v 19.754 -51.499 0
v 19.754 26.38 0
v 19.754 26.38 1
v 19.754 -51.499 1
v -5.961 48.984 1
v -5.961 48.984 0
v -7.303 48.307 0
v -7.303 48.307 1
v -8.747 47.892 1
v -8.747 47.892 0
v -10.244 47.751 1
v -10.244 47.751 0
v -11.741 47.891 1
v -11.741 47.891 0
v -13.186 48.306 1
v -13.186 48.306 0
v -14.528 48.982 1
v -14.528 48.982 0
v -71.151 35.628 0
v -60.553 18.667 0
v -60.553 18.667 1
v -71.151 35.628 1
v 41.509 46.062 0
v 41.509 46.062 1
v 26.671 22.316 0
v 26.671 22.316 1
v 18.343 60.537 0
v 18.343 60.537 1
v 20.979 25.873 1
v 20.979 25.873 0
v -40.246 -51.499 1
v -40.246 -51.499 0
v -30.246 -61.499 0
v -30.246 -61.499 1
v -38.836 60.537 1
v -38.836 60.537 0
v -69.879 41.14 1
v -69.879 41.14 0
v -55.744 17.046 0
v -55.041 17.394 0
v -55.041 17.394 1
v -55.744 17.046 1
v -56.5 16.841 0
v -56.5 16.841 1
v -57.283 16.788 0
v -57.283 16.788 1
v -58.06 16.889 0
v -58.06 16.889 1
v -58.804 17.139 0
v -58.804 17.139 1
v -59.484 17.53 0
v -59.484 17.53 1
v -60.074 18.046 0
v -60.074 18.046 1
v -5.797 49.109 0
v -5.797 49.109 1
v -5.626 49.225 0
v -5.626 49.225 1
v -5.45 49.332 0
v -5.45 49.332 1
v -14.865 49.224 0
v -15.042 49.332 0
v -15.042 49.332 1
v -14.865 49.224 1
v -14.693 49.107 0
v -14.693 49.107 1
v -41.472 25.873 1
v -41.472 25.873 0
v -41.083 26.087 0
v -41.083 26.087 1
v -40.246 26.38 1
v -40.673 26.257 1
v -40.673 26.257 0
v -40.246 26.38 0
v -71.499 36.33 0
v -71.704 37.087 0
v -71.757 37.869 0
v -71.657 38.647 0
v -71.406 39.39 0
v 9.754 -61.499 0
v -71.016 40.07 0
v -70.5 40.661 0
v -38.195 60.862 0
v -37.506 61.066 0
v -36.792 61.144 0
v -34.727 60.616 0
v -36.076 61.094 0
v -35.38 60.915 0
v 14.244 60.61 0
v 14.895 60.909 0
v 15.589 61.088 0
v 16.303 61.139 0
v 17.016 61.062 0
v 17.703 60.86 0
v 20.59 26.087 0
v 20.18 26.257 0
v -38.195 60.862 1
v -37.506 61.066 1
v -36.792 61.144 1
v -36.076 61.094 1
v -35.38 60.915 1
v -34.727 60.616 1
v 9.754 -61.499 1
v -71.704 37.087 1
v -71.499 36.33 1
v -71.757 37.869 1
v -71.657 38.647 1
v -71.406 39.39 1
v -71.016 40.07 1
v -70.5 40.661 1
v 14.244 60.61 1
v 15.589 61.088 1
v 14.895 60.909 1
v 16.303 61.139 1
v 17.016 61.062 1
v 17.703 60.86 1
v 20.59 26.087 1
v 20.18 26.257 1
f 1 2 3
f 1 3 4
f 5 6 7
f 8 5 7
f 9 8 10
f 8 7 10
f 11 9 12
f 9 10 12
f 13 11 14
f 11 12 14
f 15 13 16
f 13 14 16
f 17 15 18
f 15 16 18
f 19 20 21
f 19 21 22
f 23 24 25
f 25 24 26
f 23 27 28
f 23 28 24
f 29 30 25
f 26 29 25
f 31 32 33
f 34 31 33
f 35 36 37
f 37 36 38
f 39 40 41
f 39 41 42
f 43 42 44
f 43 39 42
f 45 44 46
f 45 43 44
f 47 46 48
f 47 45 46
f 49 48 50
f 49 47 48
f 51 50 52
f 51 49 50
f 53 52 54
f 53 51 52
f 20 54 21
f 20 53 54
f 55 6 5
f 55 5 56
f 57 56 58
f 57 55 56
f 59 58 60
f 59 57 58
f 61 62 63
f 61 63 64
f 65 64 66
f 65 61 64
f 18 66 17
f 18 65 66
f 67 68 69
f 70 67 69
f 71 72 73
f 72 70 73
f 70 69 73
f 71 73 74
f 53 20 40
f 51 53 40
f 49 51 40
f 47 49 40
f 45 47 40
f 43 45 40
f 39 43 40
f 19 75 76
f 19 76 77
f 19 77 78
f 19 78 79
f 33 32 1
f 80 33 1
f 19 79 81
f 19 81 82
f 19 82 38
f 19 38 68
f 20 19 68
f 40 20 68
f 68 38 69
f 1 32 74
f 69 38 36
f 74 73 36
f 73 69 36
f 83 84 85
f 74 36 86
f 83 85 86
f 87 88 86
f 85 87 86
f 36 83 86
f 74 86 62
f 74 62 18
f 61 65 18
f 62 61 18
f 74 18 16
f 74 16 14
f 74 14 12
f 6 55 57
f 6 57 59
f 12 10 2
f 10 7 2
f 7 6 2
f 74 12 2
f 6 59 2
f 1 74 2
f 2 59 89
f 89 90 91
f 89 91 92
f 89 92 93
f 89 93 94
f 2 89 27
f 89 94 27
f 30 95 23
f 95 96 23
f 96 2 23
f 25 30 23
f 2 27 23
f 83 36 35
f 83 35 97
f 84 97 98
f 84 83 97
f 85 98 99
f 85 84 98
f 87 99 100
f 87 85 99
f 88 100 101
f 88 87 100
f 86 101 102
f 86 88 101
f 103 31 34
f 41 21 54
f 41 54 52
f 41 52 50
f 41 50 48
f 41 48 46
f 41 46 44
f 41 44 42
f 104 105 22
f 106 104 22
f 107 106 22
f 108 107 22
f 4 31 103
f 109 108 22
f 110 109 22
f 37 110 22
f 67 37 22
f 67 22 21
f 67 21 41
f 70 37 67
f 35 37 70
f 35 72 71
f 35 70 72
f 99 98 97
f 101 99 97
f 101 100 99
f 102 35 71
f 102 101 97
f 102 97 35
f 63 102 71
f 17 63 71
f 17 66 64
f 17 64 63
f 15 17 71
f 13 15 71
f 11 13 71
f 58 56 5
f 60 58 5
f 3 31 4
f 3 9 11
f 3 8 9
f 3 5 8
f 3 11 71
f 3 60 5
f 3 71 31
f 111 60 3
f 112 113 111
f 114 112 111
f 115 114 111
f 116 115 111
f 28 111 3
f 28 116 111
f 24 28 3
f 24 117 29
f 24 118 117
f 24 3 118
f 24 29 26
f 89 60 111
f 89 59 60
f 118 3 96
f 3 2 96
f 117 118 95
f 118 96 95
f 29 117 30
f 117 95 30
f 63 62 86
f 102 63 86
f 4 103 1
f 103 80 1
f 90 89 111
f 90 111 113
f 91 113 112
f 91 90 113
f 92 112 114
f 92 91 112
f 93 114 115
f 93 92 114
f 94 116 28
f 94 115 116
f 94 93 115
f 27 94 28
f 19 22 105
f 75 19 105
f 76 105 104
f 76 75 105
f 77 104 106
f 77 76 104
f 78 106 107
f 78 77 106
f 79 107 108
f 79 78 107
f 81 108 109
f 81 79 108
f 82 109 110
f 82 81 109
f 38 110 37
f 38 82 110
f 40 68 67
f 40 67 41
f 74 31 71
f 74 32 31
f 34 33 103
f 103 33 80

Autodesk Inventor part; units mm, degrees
ref_plane "YZ Plane" through (0, 0, 0) normal (1, 0, 0) x (0, 1, 0)
ref_plane "XZ Plane" through (0, 0, 0) normal (0, 1, 0) x (-1, 0, 0)
ref_plane "XY Plane" through (0, 0, 0) normal (0, 0, 1) x (1, 0, 0)
sketch "Sketch1" plane through (0, 0, 0) normal (0, 0, 1) x (1, 0, 0)
  line L0 (19.7536, 18.501) -> (19.7536, -51.499)
  line L1 (-40.2464, -51.499) -> (-40.2464, 18.501)
  line L2 (-40.2464, -51.499) -> (-30.2464, -61.499)
  line L3 (-30.2464, -61.499) -> (9.7536, -61.499)
  line L4 (9.7536, -61.499) -> (19.7536, -51.499)
  line L5 (5.9033, -42.3953) -> (-35.9604, 24.6005)
  line L6 (-41.4722, 25.873) -> (-55.041, 17.3943)
  line L7 (-60.5529, 18.6668) -> (-71.151, 35.6275)
  line L8 (8.6592, -43.0315) -> (13.7475, -39.852)
  line L9 (14.3837, -37.0961) -> (-27.4799, 29.8997)
  line L10 (-26.2074, 35.4116) -> (-14.9119, 42.4698)
  line L11 (-15.0424, 49.3323) -> (-34.727, 60.6155)
  line L12 (-38.8359, 60.5374) -> (-69.8786, 41.1398)
  arc A0 (-34.727, 60.6155) -> (-38.8359, 60.5374) centre (-36.7162, 57.1452) ccw
  arc A1 (-14.9119, 42.4698) -> (-15.0424, 49.3323) centre (-17.0316, 45.8619) ccw
  arc A2 (-35.9604, 24.6005) -> (-41.4722, 25.873) centre (-39.3526, 22.4808) ccw
  arc A3 (-26.2074, 35.4116) -> (-27.4799, 29.8997) centre (-24.0877, 32.0194) ccw
  arc A4 (5.9033, -42.3953) -> (8.6592, -43.0315) centre (7.5994, -41.3354) ccw
  arc A5 (13.7475, -39.852) -> (14.3837, -37.0961) centre (12.6876, -38.1559) ccw
  line L13 (-26.3961, -42.3953) -> (15.4675, 24.6005)
  line L14 (20.9794, 25.873) -> (34.5482, 17.3943)
  line L15 (40.3411, 19.095) -> (50.6682, 35.6217)
  line L16 (-29.152, -43.0315) -> (-34.2403, -39.852)
  line L17 (-34.8766, -37.0961) -> (6.9871, 29.8997)
  line L18 (5.7136, 35.4098) -> (-5.5789, 42.4725)
  line L19 (-5.4504, 49.3323) -> (14.2435, 60.6103)
  line L20 (18.3431, 60.5374) -> (49.3859, 41.1397)
  arc A6 (18.3431, 60.5374) -> (14.2435, 60.6103) centre (16.2322, 57.1397) ccw
  arc A7 (-5.4504, 49.3323) -> (-5.5789, 42.4725) centre (-3.4579, 45.8638) ccw
  arc A8 (20.9794, 25.873) -> (15.4675, 24.6005) centre (18.8597, 22.4808) ccw
  arc A9 (6.9871, 29.8997) -> (5.7136, 35.4098) centre (3.5938, 32.0177) ccw
  arc A10 (-29.152, -43.0315) -> (-26.3961, -42.3953) centre (-28.0922, -41.3354) ccw
  arc A11 (-34.8766, -37.0961) -> (-34.2403, -39.852) centre (-33.1805, -38.1559) ccw
  arc A12 (-15.0424, 49.3323) -> (-5.4504, 49.3323) centre (-10.2464, 55.8144) ccw
  circle A13 centre (-10.2464, -7.115) radius 26
  circle A14 centre (-10.2464, -7.115) radius 20
  line L21 (-40.2464, 18.501) -> (-40.2464, 26.3797)
  line L22 (19.7536, 18.501) -> (19.7536, 26.3797)
  line L23 (-60.5529, 18.6668) -> (-60.5529, 18.6668)
  line L24 (-55.041, 17.3943) -> (-55.041, 17.3943)
  line L25 (-69.8786, 41.1398) -> (-69.8787, 41.1397)
  line L26 (-71.1513, 35.6278) -> (-71.151, 35.6275)
  arc A15 (-69.8787, 41.1397) -> (-71.1513, 35.6278) centre (-67.7591, 37.7475) ccw
  arc A16 (-60.5529, 18.6668) -> (-55.041, 17.3943) centre (-57.1607, 20.7865) ccw
  line L27 (49.3957, 41.1336) -> (49.3859, 41.1397)
  line L28 (50.6682, 35.6217) -> (50.6682, 35.6217)
  line L29 (34.5482, 17.3943) -> (34.5579, 17.3883)
  line L30 (40.3411, 19.095) -> (40.0698, 18.6608)
  arc A17 (34.5579, 17.3883) -> (40.0698, 18.6608) centre (36.6776, 20.7804) ccw
  arc A18 (50.6682, 35.6217) -> (49.3957, 41.1336) centre (47.276, 37.7414) ccw
  point P0 (0, 0)
  point P1 (-9.2464, 46.01)
  point P2 (-36.8049, 61.8065)
  point P3 (-20.4928, 0)
  point P4 (-11.243, 46.015)
  point P5 (16.3218, 61.8004)
  dimension "d0" = 70
  dimension "d1" = 135
  dimension "d2" = 135
  dimension "d3" = 10
  dimension "d4" = 10
  dimension "d5" = 40
  dimension "d6" = 10
  dimension "d7" = 85
  dimension "d8" = 24
  dimension "d9" = 24
  dimension "d10" = 28
  dimension "d11" = 43
  dimension "d13" = 2
  dimension "d14" = 31
  dimension "d15" = 32
  dimension "d19" = 70
  dimension "d21" = 52
  dimension "d22" = 40
  dimension "d43" = 8.0635
  dimension "d66" = 54.384
  dimension "d74" = 4
  dimension "d75" = 4
  dimension "d77" = 43
  dimension "d78" = 85
  dimension "d79" = 4
extrude "Extrusion2" add sketch "Sketch1" along normal blind 1
sketch "Sketch11" plane through (0, 0, 1) normal (0, 0, 1) x (1, 0, 0)
  line L0 (40.0698, 18.6608) -> (50.6682, 35.6217) projected
  line L1 (-15.0424, 49.3323) -> (-34.727, 60.6155) projected
  arc A0 (-34.727, 60.6155) -> (-38.8359, 60.5374) centre (-36.7162, 57.1452) ccw projected
  line L2 (-38.8359, 60.5374) -> (-69.8787, 41.1397) projected
  arc A1 (-69.8787, 41.1397) -> (-71.1513, 35.6278) centre (-67.7591, 37.7475) ccw projected
  line L3 (-71.1513, 35.6278) -> (-60.5529, 18.6668) projected
  arc A2 (-60.5529, 18.6668) -> (-55.041, 17.3943) centre (-57.1607, 20.7865) ccw projected
  line L4 (-55.041, 17.3943) -> (-41.4722, 25.873) projected
  arc A3 (-40.2464, 26.3797) -> (-41.4722, 25.873) centre (-39.3526, 22.4808) ccw projected
  line L5 (-40.2464, 26.3797) -> (-40.2464, -51.499) projected
  line L6 (-40.2464, -51.499) -> (-30.2464, -61.499) projected
  line L7 (-30.2464, -61.499) -> (9.7536, -61.499) projected
  line L8 (9.7536, -61.499) -> (19.7536, -51.499) projected
  line L9 (19.7536, -51.499) -> (19.7536, 26.3797) projected
  arc A4 (20.9794, 25.873) -> (19.7536, 26.3797) centre (18.8597, 22.4808) ccw projected
  line L10 (20.9794, 25.873) -> (34.5579, 17.3883) projected
  arc A5 (34.5579, 17.3883) -> (40.0698, 18.6608) centre (36.6776, 20.7804) ccw projected
  line L11 (40.0698, 18.6608) -> (50.6682, 35.6217) projected
  arc A6 (50.6682, 35.6217) -> (49.3957, 41.1336) centre (47.276, 37.7414) ccw projected
  line L12 (49.3957, 41.1336) -> (18.3431, 60.5374) projected
  arc A7 (18.3431, 60.5374) -> (14.2435, 60.6103) centre (16.2322, 57.1397) ccw projected
  line L13 (14.2435, 60.6103) -> (-5.4504, 49.3323) projected
  arc A8 (-5.4504, 49.3323) -> (-5.9605, 48.9843) centre (-3.4579, 45.8638) ccw projected
  arc A9 (-14.528, 48.9816) -> (-5.9605, 48.9843) centre (-10.2464, 55.8144) ccw projected
  arc A10 (-14.528, 48.9816) -> (-15.0424, 49.3323) centre (-17.0316, 45.8619) ccw projected
  line L14 (41.5088, 46.0618) -> (26.6711, 22.3165)
  point P0 (0, 0)
  dimension "d80" = 13.3
extrude "Extrusion9" cut sketch "Sketch11" against normal blind 10 contours A5 L10 L14 L12 A6 L0
properties part number "Boilermake_PCBMechanicalOverlay"
